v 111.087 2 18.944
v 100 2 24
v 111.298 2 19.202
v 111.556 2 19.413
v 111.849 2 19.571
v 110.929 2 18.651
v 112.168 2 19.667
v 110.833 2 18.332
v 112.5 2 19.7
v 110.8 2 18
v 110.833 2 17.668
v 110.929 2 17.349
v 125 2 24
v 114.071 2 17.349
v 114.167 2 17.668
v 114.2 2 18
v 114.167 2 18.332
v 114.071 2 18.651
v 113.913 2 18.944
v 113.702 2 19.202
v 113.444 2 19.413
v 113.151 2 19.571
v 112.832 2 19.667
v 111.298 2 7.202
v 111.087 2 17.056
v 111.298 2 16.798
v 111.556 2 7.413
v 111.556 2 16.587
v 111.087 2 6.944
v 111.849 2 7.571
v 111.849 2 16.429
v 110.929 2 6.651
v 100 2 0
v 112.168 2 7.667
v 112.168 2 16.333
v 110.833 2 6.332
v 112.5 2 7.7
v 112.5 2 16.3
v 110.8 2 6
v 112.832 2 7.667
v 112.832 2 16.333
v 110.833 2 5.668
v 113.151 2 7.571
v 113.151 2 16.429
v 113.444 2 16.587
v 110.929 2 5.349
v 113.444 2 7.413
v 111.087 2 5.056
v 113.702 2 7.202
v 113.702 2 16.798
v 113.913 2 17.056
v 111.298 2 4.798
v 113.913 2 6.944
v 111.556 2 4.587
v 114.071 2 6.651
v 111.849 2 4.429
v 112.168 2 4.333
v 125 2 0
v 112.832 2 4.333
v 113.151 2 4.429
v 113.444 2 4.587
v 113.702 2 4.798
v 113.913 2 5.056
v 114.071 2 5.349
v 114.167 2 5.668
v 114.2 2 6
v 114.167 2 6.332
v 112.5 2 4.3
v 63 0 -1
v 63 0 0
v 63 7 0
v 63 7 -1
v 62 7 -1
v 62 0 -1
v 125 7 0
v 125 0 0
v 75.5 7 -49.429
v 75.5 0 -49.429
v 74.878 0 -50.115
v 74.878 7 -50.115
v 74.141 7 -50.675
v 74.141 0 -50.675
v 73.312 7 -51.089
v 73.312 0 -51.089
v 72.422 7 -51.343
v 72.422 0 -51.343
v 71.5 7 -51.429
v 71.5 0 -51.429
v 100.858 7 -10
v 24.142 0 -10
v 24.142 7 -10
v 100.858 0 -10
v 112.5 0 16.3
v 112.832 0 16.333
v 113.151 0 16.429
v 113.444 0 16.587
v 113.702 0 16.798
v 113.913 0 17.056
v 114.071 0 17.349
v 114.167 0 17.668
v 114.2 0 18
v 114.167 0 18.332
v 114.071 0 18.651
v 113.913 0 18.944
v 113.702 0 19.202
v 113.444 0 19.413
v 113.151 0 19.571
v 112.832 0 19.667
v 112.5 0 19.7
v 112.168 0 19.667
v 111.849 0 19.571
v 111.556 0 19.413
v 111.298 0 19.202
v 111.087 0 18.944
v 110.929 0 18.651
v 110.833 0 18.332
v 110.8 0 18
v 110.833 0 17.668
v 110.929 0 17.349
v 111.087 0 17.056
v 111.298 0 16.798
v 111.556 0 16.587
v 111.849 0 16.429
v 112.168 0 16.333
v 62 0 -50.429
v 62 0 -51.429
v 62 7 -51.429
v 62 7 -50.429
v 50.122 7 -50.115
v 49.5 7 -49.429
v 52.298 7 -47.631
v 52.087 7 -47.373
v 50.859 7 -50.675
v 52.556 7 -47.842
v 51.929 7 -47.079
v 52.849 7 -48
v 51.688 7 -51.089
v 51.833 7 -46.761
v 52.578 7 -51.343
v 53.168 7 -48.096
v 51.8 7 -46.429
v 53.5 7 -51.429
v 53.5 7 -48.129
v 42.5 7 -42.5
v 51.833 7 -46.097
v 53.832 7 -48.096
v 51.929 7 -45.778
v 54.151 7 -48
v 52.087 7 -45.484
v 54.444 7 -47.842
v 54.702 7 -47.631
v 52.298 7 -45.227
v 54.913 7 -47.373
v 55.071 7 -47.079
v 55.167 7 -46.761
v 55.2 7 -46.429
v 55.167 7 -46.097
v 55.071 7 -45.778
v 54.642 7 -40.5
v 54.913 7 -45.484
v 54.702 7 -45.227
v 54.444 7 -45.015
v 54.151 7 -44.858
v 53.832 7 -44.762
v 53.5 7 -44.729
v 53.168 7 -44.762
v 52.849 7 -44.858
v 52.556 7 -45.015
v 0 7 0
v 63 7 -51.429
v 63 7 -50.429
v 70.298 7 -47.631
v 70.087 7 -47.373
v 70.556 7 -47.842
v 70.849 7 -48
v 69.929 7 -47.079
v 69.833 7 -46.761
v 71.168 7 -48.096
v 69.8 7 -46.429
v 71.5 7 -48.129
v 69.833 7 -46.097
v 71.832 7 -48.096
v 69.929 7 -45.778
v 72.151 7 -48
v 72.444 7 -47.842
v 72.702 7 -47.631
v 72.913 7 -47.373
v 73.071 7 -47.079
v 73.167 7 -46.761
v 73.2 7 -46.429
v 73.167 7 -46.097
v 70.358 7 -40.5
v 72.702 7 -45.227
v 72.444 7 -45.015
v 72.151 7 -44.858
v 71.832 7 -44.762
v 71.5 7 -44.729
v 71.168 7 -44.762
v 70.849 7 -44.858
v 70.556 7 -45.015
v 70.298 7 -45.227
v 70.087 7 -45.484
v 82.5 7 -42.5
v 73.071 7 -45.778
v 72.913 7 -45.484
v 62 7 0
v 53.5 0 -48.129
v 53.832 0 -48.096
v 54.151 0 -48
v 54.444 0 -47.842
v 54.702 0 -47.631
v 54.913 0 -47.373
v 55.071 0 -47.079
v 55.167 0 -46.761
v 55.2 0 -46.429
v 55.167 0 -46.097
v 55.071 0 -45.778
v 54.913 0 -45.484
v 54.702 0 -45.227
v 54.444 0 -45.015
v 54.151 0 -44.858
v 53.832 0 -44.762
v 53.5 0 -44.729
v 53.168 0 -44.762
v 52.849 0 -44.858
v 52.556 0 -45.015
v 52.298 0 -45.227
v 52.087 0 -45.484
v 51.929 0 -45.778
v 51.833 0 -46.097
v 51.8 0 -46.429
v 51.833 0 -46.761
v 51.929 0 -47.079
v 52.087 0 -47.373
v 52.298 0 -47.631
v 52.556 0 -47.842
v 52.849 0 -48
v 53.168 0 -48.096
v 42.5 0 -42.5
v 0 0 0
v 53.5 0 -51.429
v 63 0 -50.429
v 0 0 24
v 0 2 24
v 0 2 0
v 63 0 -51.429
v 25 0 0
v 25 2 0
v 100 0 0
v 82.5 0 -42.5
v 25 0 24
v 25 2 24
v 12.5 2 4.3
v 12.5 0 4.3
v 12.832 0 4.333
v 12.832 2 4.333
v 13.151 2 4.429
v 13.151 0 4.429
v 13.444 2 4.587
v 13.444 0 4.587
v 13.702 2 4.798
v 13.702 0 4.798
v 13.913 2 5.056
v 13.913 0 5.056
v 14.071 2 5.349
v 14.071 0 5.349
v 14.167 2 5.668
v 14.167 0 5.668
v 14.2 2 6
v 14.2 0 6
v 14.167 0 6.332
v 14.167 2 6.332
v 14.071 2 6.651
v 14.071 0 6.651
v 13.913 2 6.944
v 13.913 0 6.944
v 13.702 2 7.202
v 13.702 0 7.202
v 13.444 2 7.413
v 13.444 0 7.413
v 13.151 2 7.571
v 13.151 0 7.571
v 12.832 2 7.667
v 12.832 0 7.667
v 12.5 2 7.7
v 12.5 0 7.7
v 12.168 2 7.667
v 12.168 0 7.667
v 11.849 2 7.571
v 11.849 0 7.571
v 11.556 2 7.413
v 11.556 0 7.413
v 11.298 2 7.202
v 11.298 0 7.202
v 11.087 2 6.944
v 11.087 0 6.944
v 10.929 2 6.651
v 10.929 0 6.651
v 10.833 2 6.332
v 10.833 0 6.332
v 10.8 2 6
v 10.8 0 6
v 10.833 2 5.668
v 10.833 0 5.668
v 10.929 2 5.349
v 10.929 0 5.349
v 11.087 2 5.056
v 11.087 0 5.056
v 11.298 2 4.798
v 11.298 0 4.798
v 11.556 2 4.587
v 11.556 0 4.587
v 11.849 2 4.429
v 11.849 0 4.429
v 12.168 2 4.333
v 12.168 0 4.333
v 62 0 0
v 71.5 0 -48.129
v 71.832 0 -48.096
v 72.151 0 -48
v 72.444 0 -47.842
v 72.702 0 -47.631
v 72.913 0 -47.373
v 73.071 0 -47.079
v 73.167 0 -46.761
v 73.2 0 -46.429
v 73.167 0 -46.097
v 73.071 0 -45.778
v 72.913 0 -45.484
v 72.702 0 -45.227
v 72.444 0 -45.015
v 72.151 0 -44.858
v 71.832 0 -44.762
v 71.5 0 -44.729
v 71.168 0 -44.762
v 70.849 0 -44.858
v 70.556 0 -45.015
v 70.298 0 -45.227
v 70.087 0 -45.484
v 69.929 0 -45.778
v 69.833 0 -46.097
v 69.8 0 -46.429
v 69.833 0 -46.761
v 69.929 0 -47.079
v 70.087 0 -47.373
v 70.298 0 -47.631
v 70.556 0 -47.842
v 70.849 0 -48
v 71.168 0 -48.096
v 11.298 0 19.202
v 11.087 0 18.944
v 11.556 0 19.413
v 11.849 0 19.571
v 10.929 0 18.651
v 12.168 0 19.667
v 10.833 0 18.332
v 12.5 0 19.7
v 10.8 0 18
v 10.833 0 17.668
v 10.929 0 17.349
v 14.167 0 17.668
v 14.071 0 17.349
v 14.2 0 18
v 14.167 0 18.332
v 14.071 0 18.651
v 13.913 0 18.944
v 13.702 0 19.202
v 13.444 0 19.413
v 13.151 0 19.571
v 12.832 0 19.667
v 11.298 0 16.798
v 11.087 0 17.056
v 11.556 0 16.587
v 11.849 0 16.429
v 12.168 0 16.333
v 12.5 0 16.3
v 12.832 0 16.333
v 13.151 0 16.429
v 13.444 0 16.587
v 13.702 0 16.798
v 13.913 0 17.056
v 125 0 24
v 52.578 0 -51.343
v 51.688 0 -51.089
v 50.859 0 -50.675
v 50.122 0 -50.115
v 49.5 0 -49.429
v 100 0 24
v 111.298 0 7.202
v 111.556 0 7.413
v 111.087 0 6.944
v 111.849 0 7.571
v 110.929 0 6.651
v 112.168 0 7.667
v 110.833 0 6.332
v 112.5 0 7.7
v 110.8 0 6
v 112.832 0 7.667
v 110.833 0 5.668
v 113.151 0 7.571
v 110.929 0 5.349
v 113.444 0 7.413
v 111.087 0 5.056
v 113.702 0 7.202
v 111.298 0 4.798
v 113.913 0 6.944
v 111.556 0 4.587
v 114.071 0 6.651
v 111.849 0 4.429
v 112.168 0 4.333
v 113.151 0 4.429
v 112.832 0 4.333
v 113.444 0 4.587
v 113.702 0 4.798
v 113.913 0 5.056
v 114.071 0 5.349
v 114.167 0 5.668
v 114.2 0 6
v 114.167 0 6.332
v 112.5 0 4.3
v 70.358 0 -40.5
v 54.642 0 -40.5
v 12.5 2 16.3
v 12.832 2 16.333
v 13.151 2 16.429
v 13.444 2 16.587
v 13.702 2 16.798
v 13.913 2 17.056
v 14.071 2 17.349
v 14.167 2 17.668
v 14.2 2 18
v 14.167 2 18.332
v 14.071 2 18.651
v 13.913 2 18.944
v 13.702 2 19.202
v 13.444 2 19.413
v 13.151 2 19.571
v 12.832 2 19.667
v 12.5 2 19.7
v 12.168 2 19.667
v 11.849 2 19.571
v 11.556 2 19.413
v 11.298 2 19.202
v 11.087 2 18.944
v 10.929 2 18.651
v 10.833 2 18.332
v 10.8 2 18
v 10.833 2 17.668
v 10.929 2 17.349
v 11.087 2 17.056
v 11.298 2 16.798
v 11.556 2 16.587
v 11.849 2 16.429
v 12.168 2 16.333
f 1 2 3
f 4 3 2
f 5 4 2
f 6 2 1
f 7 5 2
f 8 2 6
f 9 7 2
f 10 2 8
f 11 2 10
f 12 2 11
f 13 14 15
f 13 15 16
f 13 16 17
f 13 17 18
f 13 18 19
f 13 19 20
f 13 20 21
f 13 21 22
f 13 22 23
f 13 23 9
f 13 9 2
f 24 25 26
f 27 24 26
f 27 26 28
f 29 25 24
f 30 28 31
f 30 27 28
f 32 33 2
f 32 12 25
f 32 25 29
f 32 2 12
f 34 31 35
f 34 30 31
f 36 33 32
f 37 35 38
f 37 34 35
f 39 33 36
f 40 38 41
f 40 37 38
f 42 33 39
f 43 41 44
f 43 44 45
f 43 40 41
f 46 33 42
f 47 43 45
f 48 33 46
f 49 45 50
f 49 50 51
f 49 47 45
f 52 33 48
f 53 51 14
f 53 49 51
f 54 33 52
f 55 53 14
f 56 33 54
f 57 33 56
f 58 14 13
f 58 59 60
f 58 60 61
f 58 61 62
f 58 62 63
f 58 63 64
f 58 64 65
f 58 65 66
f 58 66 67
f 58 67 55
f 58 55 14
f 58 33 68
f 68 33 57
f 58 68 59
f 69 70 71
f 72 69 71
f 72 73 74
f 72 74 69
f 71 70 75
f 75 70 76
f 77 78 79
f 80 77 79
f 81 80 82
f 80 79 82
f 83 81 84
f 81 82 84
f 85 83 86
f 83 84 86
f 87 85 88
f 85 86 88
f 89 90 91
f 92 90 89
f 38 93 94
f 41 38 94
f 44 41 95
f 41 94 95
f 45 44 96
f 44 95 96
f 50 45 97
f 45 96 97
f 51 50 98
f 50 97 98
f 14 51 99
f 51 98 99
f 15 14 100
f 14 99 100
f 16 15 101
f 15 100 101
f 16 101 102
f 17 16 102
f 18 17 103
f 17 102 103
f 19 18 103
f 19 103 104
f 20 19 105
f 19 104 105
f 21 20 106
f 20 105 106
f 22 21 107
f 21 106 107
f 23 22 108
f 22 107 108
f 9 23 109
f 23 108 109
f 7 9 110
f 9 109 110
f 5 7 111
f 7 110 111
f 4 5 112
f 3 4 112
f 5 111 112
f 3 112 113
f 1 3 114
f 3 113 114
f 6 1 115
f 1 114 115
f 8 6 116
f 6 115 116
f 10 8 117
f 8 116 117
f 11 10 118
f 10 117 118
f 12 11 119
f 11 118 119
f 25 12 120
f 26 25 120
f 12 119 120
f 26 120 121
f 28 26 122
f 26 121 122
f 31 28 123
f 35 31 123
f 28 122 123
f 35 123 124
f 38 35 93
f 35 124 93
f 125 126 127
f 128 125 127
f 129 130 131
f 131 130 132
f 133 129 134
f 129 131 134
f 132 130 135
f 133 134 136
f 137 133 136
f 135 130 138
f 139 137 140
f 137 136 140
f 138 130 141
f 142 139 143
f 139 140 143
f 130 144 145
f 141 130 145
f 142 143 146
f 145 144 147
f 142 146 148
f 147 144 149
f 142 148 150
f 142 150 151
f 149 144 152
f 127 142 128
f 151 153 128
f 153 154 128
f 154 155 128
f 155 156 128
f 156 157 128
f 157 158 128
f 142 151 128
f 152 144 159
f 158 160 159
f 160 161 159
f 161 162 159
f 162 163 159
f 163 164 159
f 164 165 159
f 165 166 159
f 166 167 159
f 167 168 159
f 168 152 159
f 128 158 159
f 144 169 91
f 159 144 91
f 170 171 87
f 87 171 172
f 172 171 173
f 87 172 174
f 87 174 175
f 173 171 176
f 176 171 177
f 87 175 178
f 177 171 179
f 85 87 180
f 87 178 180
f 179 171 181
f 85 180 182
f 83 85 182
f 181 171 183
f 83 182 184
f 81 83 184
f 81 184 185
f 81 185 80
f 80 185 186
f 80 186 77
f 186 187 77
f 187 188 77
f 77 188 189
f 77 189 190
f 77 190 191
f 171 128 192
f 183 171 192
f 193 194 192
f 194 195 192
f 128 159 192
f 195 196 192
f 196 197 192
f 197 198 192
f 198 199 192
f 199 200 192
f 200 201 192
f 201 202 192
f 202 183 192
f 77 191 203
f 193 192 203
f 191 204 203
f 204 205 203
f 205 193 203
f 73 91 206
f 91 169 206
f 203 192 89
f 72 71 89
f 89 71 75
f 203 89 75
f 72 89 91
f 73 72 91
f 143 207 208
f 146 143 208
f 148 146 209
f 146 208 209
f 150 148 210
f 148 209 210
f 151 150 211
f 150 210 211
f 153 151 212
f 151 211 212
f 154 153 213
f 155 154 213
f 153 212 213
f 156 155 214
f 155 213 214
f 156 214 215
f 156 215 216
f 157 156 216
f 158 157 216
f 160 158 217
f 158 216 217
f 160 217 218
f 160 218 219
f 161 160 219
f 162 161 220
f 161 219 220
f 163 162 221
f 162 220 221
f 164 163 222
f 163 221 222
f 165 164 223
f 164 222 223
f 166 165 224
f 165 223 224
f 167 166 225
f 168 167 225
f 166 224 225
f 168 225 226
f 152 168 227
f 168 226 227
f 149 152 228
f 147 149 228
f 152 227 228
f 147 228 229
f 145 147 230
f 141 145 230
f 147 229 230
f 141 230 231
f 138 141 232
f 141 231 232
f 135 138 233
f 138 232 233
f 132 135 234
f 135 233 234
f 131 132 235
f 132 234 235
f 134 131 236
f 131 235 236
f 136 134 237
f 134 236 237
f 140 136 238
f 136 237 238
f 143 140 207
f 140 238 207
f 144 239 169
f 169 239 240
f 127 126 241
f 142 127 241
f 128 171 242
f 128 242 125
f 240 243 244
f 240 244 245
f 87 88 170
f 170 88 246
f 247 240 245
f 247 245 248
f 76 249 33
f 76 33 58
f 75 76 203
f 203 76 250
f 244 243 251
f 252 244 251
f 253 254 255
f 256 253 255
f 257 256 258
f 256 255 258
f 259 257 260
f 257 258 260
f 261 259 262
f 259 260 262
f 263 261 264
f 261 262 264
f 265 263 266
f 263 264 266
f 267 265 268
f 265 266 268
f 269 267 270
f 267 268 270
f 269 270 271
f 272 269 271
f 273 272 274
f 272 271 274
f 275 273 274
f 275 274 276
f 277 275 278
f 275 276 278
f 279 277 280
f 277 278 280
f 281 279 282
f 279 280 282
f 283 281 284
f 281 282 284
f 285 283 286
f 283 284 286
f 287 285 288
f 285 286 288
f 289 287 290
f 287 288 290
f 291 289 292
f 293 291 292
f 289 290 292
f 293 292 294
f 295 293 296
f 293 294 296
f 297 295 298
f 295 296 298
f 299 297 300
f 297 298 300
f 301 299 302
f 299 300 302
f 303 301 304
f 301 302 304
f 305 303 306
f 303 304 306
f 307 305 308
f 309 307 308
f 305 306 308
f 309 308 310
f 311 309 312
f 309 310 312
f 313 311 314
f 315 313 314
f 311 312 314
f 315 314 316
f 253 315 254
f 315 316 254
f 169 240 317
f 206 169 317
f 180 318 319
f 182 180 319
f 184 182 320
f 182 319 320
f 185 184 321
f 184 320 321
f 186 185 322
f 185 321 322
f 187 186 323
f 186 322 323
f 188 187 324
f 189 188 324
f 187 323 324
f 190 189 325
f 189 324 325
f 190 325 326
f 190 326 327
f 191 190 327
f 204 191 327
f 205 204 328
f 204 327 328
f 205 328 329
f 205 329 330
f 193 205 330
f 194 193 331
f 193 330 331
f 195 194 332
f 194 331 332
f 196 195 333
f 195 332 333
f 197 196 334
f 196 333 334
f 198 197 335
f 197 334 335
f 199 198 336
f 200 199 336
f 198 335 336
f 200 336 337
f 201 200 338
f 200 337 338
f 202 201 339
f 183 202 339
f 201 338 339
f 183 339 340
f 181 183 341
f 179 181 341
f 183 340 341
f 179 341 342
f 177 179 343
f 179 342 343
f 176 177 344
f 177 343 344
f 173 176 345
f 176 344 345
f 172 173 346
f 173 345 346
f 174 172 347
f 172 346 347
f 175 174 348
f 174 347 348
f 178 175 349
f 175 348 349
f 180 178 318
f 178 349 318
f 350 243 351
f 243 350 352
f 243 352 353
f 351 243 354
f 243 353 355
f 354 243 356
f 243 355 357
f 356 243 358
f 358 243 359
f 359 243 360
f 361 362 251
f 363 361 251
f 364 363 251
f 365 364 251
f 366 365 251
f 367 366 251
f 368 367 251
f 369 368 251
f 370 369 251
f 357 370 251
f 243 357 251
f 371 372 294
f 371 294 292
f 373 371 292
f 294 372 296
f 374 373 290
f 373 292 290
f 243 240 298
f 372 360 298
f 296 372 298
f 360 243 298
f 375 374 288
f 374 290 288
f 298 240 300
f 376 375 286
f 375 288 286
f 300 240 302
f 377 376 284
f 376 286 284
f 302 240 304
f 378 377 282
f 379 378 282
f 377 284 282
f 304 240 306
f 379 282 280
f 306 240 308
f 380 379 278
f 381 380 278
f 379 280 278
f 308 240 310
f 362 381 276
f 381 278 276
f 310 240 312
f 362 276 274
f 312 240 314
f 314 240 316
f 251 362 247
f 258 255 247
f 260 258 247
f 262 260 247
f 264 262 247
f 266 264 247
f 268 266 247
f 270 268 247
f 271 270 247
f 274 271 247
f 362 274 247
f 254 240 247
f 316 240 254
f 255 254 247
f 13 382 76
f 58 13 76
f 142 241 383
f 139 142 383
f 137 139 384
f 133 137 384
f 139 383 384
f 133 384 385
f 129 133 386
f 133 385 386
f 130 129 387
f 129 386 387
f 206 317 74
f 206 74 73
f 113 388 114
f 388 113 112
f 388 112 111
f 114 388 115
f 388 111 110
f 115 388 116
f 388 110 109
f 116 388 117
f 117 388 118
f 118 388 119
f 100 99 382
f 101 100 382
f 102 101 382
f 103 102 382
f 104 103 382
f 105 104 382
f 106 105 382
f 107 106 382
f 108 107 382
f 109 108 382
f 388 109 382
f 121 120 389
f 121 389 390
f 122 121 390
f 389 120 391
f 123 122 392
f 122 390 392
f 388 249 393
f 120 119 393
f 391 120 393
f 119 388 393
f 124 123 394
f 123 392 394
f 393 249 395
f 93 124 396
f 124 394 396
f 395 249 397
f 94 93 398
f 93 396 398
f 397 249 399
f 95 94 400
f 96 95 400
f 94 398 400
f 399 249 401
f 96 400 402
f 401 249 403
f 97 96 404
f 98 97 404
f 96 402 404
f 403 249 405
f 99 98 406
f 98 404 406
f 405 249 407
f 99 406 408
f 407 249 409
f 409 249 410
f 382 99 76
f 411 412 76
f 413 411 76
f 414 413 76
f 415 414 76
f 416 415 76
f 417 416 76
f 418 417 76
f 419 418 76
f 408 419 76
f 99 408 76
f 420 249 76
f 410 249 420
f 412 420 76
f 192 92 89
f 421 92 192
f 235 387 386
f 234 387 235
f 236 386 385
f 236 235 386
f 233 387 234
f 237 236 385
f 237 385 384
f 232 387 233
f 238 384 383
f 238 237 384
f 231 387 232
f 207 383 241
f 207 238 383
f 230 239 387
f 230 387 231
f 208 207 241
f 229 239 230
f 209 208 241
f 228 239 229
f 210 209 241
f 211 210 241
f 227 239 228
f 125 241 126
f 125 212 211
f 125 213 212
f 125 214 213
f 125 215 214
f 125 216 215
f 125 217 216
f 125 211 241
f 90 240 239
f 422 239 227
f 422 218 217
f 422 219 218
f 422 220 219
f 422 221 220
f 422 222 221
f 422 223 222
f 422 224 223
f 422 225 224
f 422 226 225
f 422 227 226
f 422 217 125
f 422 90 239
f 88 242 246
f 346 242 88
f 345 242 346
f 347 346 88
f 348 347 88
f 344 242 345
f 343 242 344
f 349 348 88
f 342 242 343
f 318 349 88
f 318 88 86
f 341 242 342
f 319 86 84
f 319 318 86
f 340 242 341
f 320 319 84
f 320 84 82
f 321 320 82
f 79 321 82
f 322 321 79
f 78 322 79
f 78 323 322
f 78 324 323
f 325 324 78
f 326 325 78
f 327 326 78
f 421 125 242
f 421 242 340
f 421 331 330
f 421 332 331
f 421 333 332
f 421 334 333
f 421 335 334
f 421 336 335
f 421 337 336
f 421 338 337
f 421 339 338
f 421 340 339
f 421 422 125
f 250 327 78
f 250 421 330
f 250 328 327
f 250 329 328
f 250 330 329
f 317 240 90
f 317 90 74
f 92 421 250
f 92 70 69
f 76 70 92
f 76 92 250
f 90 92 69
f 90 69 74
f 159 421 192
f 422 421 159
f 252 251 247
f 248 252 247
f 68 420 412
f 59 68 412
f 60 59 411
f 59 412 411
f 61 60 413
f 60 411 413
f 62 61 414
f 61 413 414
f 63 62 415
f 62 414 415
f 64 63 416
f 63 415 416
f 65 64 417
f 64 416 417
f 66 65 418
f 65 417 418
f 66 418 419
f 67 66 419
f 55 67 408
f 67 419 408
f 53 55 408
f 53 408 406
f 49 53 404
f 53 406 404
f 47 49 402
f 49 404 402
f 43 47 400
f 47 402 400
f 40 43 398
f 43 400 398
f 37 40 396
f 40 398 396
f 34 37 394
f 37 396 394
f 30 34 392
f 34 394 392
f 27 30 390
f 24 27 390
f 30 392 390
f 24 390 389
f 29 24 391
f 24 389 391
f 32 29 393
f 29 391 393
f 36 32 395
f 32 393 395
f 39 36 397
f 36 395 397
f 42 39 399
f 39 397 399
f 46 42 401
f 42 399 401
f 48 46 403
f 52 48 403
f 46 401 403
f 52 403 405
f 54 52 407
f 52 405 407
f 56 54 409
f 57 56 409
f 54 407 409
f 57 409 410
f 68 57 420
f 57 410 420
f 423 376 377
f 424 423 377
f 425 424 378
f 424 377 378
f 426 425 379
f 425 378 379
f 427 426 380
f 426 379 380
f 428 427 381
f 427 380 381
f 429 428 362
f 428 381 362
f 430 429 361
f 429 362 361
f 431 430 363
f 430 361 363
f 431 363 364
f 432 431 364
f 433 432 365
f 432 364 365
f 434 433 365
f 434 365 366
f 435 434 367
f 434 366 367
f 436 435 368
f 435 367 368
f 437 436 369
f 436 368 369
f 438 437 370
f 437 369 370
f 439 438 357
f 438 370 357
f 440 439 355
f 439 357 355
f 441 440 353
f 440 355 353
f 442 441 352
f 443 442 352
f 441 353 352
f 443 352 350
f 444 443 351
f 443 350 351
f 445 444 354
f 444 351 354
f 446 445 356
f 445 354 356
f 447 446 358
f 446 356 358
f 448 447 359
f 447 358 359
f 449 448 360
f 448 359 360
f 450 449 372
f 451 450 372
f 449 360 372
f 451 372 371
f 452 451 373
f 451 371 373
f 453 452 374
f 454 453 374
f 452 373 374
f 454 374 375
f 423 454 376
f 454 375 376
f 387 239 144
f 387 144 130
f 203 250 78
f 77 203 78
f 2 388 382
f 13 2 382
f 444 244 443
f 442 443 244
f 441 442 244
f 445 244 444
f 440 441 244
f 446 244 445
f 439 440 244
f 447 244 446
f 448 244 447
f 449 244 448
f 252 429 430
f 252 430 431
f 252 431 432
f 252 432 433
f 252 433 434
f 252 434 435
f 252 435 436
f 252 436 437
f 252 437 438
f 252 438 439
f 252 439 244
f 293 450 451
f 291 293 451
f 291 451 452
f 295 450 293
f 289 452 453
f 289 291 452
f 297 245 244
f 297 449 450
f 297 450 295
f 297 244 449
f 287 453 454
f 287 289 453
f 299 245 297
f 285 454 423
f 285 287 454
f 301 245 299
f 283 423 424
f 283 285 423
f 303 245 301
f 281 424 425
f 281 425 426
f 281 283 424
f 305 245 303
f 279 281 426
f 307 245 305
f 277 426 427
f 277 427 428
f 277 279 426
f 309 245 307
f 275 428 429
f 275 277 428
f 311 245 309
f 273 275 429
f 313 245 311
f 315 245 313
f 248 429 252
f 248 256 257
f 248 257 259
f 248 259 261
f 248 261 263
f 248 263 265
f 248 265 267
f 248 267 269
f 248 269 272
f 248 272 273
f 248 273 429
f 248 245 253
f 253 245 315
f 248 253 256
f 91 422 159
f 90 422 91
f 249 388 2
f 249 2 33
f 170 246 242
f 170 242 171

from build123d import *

# Parameters (mm, degrees)
BEARING_MOUNTS_W             = 25
BEARING_MOUNTS_H             = 24
BEARING_MOUNT_PLATES_DEPTH   = 2
BEARING_MOUNT_PLATES_2_DEPTH = 2
BRIDGE_DEPTH                 = 7
M3_BEARING_HOLES_R           = 1.7
BEARING_MOUNT_HOLES_DEPTH    = 2
BELT_MOUNT_PLATE_DEPTH       = 7
M3_BELT_HOLES_R              = 1.7
BELT_MOUNT_SCREW_HOLES_DEPTH = 7
BOSS_EXTRUDE1_DEPTH          = 7
SKETCH7_W                    = 1
SKETCH7_H                    = 7
ALIGNMENT_HELPER_1_DEPTH     = 1
SKETCH8_W                    = 1
SKETCH8_H                    = 7
ALIGNMENT_HELPER_2_DEPTH     = 1


with BuildPart() as part:
    # Bearing Mounts → Bearing Mount Plates (new body)
    with BuildSketch(Plane(origin=(0, 0, 0), x_dir=(1, 0, 0), z_dir=(0, 1, 0))):
        with Locations((12.5, -12)):
            Rectangle(BEARING_MOUNTS_W, BEARING_MOUNTS_H)
    extrude(amount=BEARING_MOUNT_PLATES_DEPTH)


with BuildPart() as body_2:
    # Bearing Mounts → Bearing Mount Plates 2 (new body)
    with BuildSketch(Plane(origin=(0, 0, 0), x_dir=(1, 0, 0), z_dir=(0, 1, 0))):
        with Locations((112.5, -12)):
            Rectangle(BEARING_MOUNTS_W, BEARING_MOUNTS_H)
    extrude(amount=BEARING_MOUNT_PLATES_2_DEPTH)


with BuildPart() as body_3:
    # Triangle → Bridge (new body)
    with BuildSketch(Plane(origin=(0, 0, 0), x_dir=(1, 0, 0), z_dir=(0, 1, 0))):
        Polygon((0, 0), (125, 0), (82.5, 42.5), (42.5, 42.5), align=None)
        Polygon((24.142135624, 10), (100.857864376, 10), (70.357864376, 40.5), (54.642135624, 40.5), align=None, mode=Mode.SUBTRACT)
    extrude(amount=BRIDGE_DEPTH)

    # Belt Mount → Belt Mount Plate (add)
    with BuildSketch(Plane.XZ):
        with BuildLine():
            Line((53.5, -41.428932188), (71.5, -41.428932188))
            ThreePointArc((71.5, -41.428932188), (76.5, -46.428932188), (71.5, -51.428932188))
            Line((71.5, -51.428932188), (53.5, -51.428932188))
            ThreePointArc((53.5, -51.428932188), (48.5, -46.428932188), (53.5, -41.428932188))
        make_face()
    extrude(amount=-BELT_MOUNT_PLATE_DEPTH)

    # M3 Belt Holes → Belt Mount Screw Holes (cut)
    with BuildSketch(Plane.XZ):
        with Locations(Location((53.5, -46.428932188, 0), (0, 0, 270))):
            Circle(M3_BELT_HOLES_R)
        with Locations(Location((71.5, -46.428932188, 0), (0, 0, 270))):
            Circle(M3_BELT_HOLES_R)
    extrude(amount=-BELT_MOUNT_SCREW_HOLES_DEPTH, mode=Mode.SUBTRACT)

    # Sketch6 → Boss-Extrude1 (add)
    with BuildSketch(Plane.XZ):
        Polygon((42.5, -42.5), (49.5, -49.428932188), (50.407510411, -42.5), align=None)
        Polygon((82.5, -42.5), (75.5, -49.428932188), (74.592489589, -42.5), align=None)
    extrude(amount=-BOSS_EXTRUDE1_DEPTH)

    # Sketch7 → Alignment helper 1 (cut)
    with BuildSketch(Plane.XY):
        with Locations((62.5, 3.5)):
            Rectangle(SKETCH7_W, SKETCH7_H)
    extrude(amount=-ALIGNMENT_HELPER_1_DEPTH, mode=Mode.SUBTRACT)

    # Sketch8 → Alignment helper 2 (cut)
    with BuildSketch(Plane(origin=(0, 0, -51.428932188), x_dir=(-1, 0, 0), z_dir=(0, 0, -1))):
        with Locations((-62.5, 3.5)):
            Rectangle(SKETCH8_W, SKETCH8_H)
    extrude(amount=-ALIGNMENT_HELPER_2_DEPTH, mode=Mode.SUBTRACT)


with BuildPart() as bearing_mount_holes_tool:
    # M3 Bearing Holes → Bearing Mount Holes (new body)
    with BuildSketch(Plane.XZ):
        with Locations(Location((112.5, 6, 0), (0, 0, 270))):
            Circle(M3_BEARING_HOLES_R)
        with Locations(Location((112.5, 18, 0), (0, 0, 270))):
            Circle(M3_BEARING_HOLES_R)
        with Locations(Location((12.5, 6, 0), (0, 0, 270))):
            Circle(M3_BEARING_HOLES_R)
        with Locations(Location((12.5, 18, 0), (0, 0, 270))):
            Circle(M3_BEARING_HOLES_R)
    extrude(amount=-BEARING_MOUNT_HOLES_DEPTH)


with BuildPart() as part_1:
    add(part.part)

    # Bearing Mount Holes: cut by bearing_mount_holes_tool
    add(bearing_mount_holes_tool.part, mode=Mode.SUBTRACT)


with BuildPart() as body_2_1:
    add(body_2.part)

    # Bearing Mount Holes: cut by bearing_mount_holes_tool
    add(bearing_mount_holes_tool.part, mode=Mode.SUBTRACT)


solid = Compound([body_3.part, part_1.part, body_2_1.part])
